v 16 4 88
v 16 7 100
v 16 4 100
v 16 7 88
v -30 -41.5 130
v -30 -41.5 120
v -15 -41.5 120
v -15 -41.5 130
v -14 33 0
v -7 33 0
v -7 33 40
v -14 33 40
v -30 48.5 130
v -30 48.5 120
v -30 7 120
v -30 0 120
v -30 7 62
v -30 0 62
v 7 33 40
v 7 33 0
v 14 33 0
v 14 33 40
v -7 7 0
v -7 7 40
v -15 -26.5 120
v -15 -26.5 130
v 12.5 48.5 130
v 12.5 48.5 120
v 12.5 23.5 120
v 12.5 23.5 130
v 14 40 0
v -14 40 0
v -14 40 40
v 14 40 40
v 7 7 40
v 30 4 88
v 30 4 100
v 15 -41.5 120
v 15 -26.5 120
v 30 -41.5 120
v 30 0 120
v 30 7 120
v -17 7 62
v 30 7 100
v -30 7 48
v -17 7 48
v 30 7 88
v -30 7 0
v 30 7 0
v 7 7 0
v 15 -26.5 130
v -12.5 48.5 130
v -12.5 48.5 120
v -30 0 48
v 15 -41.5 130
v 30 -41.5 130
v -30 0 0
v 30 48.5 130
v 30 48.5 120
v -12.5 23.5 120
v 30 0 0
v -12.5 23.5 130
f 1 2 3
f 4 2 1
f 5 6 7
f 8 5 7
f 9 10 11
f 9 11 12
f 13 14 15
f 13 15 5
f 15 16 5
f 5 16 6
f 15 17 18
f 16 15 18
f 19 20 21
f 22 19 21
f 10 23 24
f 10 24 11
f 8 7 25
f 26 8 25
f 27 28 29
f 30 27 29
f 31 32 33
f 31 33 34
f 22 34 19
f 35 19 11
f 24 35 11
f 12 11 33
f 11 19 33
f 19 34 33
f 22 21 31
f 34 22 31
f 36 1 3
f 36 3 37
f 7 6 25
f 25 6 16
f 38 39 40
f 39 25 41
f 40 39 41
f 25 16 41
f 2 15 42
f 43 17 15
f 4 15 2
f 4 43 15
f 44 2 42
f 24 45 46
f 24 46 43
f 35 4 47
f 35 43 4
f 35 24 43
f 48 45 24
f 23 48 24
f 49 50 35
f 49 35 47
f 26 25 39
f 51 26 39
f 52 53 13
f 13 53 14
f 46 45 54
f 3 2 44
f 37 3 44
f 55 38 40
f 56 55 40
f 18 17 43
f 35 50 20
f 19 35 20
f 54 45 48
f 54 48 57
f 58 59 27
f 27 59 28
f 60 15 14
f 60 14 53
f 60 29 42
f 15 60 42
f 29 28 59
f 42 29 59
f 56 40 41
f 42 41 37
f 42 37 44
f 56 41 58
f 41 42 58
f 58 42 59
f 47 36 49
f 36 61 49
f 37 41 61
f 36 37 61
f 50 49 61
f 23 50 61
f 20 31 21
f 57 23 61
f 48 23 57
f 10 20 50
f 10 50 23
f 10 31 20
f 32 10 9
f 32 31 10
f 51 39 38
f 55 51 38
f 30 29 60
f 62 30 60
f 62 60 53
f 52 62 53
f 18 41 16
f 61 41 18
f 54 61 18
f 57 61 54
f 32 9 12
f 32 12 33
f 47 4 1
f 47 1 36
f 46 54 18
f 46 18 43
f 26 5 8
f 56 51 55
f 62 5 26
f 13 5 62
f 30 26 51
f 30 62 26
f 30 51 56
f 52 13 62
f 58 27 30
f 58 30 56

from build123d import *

# Parameters (mm, degrees)
EXTRUDE_1_DEPTH     = 120
CUT_EXTRUDE_1_REACH = 132
SKETCH_3_W          = 14
SKETCH_3_H          = 80
SKETCH_4_W          = 60
SKETCH_4_H          = 7
EXTRUDE_3_DEPTH     = 10
SKETCH_5_W          = 14
SKETCH_5_H          = 12
CUT_EXTRUDE_2_DEPTH = 3
CUT_EXTRUDE_START   = -48
CUT_EXTRUDE_3_DEPTH = 14


with BuildPart() as part:
    # Эскиз1 → Бобышка-Вытянуть1 (new body)
    with BuildSketch(Plane.XY):
        Polygon((7, 7), (7, 33), (14, 33), (14, 40), (0, 40), (0, 0), (30, 0), (30, 7), (23, 7), align=None)
    extrude_1 = extrude(amount=EXTRUDE_1_DEPTH)

    # Вырез-Вытянуть1: up to this face of the body (flat: up to its plane)
    cut_extrude_1_end = Plane(part.part.faces().sort_by_distance((18.5, 7, 60))[0])
    # Эскиз3 → Вырез-Вытянуть1 (cut, up to the picked face)
    with BuildSketch(Plane(origin=(0, 40, 0), x_dir=(1, 0, 0), z_dir=(0, 1, 0)), mode=Mode.PRIVATE) as cut_extrude_1_sk1:
        with Locations((7, -80)):
            Rectangle(SKETCH_3_W, SKETCH_3_H)
    cut_extrude_1_tool1 = split(extrude(cut_extrude_1_sk1.sketch, amount=-CUT_EXTRUDE_1_REACH, mode=Mode.PRIVATE), bisect_by=cut_extrude_1_end, keep=Keep.BOTH, mode=Mode.PRIVATE)
    cut_extrude_1 = cut_extrude_1_tool1.solids().sort_by(Axis((7, 40, 80), (0, -1, 0)))[0]
    add(cut_extrude_1, mode=Mode.SUBTRACT)

    # Зеркальное отражение1: Бобышка-Вытянуть1, Вырез-Вытянуть1 across plane
    add(extrude_1.mirror(Plane(origin=(0, 0, 120), x_dir=(0, 0, 1), z_dir=(-1, 0, 0))))
    add(cut_extrude_1.mirror(Plane(origin=(0, 0, 120), x_dir=(0, 0, 1), z_dir=(-1, 0, 0))), mode=Mode.SUBTRACT)

    # Эскиз4 → Бобышка-Вытянуть3 (add)
    with BuildSketch(Plane.XY.offset(120)):
        Polygon((-30, 0), (-30, -41.5), (-15, -41.5), (-15, -26.5), (15, -26.5), (15, -41.5), (30, -41.5), (30, 0), align=None)
        Polygon((-30, 48.5), (-30, 7), (30, 7), (30, 48.5), (12.5, 48.5), (12.5, 23.5), (-12.5, 23.5), (-12.5, 48.5), align=None)
        with Locations((0, 3.5)):
            Rectangle(SKETCH_4_W, SKETCH_4_H)
    extrude(amount=EXTRUDE_3_DEPTH)

    # Эскиз5 → Вырез-Вытянуть2 (cut)
    with BuildSketch(Plane(origin=(0, 7, 0), x_dir=(1, 0, 0), z_dir=(0, 1, 0))):
        with Locations((23, -94)):
            Rectangle(SKETCH_5_W, SKETCH_5_H)
    extrude(amount=-CUT_EXTRUDE_2_DEPTH, mode=Mode.SUBTRACT)

    # Эскиз6 → Вырез-Вытянуть3 (cut)
    with BuildSketch(Plane(origin=(0, 0, 0), x_dir=(-1, 0, 0), z_dir=(0, 0, -1)).offset(CUT_EXTRUDE_START)):
        Polygon((30, 0), (17, 7), (30, 7), align=None)
    extrude(amount=-CUT_EXTRUDE_3_DEPTH, mode=Mode.SUBTRACT)


solid = part.part
